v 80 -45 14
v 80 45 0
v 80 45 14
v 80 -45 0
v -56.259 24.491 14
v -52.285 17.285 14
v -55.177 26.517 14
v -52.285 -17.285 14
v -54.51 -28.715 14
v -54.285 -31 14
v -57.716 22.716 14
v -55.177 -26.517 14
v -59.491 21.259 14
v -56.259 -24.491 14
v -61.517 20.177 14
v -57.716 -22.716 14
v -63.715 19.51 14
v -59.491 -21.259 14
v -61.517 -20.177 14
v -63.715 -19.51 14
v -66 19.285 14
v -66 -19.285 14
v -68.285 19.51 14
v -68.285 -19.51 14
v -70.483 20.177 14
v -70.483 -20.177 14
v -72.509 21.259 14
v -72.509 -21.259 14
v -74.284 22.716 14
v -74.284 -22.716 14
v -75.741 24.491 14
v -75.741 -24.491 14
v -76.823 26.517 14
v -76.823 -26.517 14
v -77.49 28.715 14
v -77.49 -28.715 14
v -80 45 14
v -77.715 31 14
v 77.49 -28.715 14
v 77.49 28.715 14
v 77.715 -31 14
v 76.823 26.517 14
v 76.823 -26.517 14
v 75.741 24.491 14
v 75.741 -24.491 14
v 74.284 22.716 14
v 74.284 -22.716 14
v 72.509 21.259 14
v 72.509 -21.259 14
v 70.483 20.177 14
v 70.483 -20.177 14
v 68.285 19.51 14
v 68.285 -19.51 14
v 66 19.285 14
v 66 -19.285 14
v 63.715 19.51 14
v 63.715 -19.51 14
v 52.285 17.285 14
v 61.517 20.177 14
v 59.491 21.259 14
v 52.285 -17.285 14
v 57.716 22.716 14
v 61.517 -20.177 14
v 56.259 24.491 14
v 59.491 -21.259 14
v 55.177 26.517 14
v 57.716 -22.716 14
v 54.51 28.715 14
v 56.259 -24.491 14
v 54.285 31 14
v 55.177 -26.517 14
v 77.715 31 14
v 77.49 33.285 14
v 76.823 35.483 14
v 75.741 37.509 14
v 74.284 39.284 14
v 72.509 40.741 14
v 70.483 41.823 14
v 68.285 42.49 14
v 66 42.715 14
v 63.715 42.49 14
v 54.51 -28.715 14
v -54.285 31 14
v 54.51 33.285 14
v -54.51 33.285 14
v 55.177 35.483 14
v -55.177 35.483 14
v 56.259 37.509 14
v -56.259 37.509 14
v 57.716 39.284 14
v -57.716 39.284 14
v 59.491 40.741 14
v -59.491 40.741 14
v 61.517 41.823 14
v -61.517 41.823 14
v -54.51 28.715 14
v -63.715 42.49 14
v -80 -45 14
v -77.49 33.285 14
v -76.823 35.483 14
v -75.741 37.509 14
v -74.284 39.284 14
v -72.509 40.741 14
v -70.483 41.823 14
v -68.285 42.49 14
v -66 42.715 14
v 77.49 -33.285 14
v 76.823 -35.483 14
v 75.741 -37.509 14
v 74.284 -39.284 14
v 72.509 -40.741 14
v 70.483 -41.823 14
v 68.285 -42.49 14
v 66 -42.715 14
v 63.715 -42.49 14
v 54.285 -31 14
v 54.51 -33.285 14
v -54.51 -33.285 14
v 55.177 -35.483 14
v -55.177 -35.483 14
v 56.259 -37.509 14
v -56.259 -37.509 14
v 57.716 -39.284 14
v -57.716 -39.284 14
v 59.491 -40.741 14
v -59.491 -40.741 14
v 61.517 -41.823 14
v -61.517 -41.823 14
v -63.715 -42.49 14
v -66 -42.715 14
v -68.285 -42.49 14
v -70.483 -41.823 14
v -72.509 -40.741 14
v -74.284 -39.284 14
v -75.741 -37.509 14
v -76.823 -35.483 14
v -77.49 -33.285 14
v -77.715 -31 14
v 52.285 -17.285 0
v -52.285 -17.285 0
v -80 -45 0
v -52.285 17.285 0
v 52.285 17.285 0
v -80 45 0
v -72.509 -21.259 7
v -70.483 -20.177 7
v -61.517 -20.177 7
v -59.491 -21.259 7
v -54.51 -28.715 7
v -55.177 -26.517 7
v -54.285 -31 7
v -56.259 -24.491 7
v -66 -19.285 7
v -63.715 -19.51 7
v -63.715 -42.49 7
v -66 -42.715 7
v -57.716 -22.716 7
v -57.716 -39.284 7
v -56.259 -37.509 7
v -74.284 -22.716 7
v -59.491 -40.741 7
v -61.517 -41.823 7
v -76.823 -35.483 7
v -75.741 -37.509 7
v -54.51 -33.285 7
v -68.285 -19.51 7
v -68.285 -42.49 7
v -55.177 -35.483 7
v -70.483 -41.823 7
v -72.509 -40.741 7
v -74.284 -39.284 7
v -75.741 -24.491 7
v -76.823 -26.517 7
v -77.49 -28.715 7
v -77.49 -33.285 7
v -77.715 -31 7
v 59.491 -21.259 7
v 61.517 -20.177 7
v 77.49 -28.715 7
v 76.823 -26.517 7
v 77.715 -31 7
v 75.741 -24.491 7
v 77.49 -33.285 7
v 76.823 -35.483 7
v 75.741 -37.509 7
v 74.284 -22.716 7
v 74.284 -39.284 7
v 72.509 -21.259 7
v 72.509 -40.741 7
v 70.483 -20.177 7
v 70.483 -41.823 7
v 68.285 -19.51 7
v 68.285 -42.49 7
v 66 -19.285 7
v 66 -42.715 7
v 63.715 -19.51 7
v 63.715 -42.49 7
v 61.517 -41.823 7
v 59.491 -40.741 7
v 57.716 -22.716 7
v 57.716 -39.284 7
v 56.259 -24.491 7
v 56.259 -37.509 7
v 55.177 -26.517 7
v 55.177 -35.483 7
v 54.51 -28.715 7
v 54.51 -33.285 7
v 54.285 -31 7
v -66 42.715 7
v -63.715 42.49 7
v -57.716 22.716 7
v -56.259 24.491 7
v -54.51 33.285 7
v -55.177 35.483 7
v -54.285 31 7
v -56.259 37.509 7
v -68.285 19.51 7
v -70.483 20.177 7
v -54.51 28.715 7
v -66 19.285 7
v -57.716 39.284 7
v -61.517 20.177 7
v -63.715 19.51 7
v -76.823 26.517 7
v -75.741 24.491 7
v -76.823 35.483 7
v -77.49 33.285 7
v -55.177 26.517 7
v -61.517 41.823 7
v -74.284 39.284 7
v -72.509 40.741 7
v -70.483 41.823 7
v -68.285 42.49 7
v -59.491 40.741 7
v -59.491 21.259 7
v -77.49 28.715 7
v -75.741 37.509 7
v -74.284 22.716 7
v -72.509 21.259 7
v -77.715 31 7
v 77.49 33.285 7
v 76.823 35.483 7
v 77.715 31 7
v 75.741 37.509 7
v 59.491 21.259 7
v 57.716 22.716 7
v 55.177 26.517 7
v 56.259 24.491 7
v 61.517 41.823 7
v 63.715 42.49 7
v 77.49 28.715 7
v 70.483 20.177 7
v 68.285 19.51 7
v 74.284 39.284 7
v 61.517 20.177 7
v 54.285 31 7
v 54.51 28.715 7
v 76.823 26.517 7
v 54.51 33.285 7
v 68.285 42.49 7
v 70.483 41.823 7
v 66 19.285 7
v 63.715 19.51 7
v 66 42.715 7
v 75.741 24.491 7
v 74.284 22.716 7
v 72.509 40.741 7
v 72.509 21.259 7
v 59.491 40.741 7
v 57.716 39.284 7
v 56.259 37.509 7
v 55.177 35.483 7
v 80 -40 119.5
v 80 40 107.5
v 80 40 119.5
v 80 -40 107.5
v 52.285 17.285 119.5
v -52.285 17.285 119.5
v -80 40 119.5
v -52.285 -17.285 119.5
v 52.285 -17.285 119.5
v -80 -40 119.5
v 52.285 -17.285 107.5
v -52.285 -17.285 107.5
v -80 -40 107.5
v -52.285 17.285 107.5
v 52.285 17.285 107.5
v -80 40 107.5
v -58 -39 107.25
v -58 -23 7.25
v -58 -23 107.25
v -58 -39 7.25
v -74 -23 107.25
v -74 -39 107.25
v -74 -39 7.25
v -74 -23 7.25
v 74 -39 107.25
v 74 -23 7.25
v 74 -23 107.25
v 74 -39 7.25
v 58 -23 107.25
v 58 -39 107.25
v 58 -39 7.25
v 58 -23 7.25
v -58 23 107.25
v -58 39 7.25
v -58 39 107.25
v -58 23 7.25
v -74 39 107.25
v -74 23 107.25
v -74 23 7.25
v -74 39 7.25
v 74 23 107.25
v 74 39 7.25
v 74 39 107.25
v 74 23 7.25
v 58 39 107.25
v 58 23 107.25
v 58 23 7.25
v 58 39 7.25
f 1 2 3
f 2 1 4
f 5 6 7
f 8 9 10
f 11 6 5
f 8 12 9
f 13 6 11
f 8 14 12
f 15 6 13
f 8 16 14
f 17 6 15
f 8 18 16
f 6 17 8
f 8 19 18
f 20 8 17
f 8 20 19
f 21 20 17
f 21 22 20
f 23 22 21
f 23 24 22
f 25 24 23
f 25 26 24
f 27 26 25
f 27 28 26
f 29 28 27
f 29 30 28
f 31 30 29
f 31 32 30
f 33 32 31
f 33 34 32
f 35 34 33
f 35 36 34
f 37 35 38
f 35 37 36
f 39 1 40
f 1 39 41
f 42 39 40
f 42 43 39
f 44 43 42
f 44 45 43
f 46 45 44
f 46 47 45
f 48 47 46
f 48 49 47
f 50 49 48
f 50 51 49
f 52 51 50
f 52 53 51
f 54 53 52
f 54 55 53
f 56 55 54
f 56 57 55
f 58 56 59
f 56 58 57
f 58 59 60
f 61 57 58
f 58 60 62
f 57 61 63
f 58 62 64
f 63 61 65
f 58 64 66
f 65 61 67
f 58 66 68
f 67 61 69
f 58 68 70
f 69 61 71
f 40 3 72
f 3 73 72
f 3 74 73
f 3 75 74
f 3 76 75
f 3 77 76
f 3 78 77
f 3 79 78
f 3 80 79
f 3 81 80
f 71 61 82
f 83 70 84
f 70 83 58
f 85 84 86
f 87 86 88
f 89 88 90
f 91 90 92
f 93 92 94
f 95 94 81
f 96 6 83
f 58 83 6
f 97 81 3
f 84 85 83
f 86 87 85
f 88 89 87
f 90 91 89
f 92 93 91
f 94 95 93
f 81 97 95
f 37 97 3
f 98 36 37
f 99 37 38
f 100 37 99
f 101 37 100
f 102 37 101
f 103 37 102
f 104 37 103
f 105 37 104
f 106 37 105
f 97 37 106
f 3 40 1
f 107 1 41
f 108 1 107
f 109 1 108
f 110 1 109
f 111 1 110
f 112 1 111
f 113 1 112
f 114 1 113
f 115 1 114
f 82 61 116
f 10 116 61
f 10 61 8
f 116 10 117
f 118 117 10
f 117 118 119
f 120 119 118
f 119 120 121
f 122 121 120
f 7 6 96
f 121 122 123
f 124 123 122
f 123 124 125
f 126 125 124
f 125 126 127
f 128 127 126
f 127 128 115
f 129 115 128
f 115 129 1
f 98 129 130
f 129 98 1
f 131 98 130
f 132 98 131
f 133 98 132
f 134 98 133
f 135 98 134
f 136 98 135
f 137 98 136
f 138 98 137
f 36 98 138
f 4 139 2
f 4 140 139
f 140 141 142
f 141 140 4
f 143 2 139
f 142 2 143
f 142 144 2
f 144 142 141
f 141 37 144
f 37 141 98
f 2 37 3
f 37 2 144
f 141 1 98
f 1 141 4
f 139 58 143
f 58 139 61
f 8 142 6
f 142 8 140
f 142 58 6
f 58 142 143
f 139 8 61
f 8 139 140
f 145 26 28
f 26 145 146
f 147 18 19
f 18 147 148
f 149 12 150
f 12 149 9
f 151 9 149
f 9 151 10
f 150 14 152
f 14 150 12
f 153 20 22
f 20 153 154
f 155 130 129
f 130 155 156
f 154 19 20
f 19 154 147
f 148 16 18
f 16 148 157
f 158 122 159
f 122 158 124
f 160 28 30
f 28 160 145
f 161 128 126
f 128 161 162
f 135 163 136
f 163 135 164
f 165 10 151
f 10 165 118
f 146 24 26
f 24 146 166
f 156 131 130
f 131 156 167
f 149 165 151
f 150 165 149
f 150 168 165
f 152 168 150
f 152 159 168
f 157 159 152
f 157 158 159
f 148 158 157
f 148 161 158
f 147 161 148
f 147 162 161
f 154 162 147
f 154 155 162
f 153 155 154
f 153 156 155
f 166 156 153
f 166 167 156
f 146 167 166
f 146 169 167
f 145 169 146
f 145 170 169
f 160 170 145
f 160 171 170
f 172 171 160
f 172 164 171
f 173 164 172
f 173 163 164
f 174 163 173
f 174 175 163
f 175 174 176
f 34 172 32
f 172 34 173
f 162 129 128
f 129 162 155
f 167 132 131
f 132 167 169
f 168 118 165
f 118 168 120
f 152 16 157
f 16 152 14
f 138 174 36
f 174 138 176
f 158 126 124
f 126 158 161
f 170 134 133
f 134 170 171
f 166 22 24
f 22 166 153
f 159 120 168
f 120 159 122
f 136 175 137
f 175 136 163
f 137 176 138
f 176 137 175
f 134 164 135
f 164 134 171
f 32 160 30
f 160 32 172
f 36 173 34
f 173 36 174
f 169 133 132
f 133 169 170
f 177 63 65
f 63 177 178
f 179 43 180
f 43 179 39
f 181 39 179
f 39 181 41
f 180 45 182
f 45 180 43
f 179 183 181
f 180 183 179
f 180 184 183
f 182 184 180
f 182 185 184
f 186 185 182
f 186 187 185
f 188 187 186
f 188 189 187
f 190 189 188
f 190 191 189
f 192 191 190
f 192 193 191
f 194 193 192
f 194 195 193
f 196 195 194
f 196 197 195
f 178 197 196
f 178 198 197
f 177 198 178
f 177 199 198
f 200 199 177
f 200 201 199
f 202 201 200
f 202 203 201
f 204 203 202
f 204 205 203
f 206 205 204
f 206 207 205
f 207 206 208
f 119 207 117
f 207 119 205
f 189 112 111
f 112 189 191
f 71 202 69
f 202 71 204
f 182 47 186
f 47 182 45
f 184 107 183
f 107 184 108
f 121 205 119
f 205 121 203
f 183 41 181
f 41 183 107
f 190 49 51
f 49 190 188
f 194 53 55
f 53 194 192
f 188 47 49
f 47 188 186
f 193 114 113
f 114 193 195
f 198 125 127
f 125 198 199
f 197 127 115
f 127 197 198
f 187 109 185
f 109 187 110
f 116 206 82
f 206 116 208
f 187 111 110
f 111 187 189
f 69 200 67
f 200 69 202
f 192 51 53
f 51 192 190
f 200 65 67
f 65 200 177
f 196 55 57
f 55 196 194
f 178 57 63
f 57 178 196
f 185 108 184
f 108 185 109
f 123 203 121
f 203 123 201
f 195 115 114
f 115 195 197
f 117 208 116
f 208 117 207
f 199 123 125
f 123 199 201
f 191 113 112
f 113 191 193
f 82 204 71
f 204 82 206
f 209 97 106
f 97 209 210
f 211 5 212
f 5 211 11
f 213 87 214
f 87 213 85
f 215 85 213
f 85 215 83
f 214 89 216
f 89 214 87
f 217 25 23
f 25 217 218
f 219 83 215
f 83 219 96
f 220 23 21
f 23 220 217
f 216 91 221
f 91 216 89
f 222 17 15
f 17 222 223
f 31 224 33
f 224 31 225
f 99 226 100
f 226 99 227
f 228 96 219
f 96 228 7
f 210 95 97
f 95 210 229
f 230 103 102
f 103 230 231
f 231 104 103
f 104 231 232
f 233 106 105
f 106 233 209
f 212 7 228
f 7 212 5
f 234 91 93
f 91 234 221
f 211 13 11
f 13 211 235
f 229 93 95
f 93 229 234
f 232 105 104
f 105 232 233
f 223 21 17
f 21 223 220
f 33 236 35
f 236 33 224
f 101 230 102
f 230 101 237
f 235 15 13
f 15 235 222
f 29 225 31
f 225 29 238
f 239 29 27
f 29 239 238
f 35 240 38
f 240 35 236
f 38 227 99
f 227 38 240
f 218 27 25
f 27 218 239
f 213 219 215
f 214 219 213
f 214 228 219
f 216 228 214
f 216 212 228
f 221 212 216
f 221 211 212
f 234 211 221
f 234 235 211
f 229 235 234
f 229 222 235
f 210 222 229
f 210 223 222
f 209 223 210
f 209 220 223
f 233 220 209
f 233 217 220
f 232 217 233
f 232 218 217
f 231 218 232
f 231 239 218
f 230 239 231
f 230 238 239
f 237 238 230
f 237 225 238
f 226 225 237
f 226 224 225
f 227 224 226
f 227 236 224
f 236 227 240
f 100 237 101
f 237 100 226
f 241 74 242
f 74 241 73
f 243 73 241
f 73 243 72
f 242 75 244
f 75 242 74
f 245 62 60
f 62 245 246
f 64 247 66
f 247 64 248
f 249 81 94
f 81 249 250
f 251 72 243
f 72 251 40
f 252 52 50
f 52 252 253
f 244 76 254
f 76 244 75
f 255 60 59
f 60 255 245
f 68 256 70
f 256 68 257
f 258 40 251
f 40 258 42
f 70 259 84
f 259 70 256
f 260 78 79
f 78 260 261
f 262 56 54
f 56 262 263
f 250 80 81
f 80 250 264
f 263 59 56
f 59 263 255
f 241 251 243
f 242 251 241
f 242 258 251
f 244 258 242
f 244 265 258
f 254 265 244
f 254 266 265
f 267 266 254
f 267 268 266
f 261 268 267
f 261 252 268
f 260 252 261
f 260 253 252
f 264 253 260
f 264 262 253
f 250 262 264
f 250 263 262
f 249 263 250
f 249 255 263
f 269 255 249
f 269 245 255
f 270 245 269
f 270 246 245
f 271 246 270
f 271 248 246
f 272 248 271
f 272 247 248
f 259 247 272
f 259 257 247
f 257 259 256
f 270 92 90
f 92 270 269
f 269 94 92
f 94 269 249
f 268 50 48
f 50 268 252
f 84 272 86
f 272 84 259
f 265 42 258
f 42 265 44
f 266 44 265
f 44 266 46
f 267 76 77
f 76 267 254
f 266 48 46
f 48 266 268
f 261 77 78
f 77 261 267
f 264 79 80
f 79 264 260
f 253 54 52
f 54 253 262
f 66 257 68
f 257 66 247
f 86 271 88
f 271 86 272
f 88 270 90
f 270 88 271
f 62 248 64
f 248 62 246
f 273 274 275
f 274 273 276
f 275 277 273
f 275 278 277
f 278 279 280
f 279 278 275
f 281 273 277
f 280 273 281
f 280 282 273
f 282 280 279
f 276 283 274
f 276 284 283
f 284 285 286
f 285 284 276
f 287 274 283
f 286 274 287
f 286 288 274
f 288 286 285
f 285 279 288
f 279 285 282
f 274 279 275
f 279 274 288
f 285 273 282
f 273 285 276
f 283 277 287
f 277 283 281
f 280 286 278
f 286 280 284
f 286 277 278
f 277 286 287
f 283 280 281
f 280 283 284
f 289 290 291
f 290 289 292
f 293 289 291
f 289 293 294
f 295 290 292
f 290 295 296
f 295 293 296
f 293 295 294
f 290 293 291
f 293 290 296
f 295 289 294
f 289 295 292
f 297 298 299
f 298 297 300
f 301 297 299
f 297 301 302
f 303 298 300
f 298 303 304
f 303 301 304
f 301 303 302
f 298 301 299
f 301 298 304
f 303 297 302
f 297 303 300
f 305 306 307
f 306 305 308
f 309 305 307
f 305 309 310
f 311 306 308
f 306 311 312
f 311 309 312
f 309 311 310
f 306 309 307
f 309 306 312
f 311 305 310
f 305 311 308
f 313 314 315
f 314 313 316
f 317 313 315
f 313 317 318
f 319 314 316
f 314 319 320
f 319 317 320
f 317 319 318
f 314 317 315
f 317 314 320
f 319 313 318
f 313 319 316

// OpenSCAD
$fn = 32;

// ------------------------------------------------------------------------
// Frame cube: base 160 x 90 mm, posts 100 mm tall
// Every part is its own module, assembly() places every instance.
// ------------------------------------------------------------------------

// --- part 1 ---
module base_frame() {
  difference() {
    translate([-80, -45, 0]) cube([160, 90, 14]);
    translate([-52.285, -17.285, -1]) cube([104.57, 34.57, 16]);
    translate([-66, -31, 7]) cylinder(h = 8, d = 23.43);
    translate([66, -31, 7]) cylinder(h = 8, d = 23.43);
    translate([-66, 31, 7]) cylinder(h = 8, d = 23.43);
    translate([66, 31, 7]) cylinder(h = 8, d = 23.43);
  }
}

// --- part 2 ---
module corner_post() {
  translate([-8, -8, 0]) cube([16, 16, 100]);
}

// --- part 3 ---
module top_frame() {
  difference() {
    translate([-80, -40, 0]) cube([160, 80, 12]);
    translate([-52.285, -17.285, -1]) cube([104.57, 34.57, 14]);
  }
}

// --- assembly ---
module assembly() {
  color([0.80, 0.24, 0.20]) translate([0, 0, 0]) rotate([0, 0, 0]) base_frame();
  color([0.20, 0.45, 0.75]) translate([-66, -31, 7.25]) rotate([0, 0, 0]) corner_post();
  color([0.25, 0.62, 0.32]) translate([66, -31, 7.25]) rotate([0, 0, 0]) corner_post();
  color([0.92, 0.70, 0.18]) translate([-66, 31, 7.25]) rotate([0, 0, 0]) corner_post();
  color([0.58, 0.35, 0.70]) translate([66, 31, 7.25]) rotate([0, 0, 0]) corner_post();
  color([0.16, 0.66, 0.66]) translate([0, 0, 107.5]) rotate([0, 0, 0]) top_frame();
}

assembly();
